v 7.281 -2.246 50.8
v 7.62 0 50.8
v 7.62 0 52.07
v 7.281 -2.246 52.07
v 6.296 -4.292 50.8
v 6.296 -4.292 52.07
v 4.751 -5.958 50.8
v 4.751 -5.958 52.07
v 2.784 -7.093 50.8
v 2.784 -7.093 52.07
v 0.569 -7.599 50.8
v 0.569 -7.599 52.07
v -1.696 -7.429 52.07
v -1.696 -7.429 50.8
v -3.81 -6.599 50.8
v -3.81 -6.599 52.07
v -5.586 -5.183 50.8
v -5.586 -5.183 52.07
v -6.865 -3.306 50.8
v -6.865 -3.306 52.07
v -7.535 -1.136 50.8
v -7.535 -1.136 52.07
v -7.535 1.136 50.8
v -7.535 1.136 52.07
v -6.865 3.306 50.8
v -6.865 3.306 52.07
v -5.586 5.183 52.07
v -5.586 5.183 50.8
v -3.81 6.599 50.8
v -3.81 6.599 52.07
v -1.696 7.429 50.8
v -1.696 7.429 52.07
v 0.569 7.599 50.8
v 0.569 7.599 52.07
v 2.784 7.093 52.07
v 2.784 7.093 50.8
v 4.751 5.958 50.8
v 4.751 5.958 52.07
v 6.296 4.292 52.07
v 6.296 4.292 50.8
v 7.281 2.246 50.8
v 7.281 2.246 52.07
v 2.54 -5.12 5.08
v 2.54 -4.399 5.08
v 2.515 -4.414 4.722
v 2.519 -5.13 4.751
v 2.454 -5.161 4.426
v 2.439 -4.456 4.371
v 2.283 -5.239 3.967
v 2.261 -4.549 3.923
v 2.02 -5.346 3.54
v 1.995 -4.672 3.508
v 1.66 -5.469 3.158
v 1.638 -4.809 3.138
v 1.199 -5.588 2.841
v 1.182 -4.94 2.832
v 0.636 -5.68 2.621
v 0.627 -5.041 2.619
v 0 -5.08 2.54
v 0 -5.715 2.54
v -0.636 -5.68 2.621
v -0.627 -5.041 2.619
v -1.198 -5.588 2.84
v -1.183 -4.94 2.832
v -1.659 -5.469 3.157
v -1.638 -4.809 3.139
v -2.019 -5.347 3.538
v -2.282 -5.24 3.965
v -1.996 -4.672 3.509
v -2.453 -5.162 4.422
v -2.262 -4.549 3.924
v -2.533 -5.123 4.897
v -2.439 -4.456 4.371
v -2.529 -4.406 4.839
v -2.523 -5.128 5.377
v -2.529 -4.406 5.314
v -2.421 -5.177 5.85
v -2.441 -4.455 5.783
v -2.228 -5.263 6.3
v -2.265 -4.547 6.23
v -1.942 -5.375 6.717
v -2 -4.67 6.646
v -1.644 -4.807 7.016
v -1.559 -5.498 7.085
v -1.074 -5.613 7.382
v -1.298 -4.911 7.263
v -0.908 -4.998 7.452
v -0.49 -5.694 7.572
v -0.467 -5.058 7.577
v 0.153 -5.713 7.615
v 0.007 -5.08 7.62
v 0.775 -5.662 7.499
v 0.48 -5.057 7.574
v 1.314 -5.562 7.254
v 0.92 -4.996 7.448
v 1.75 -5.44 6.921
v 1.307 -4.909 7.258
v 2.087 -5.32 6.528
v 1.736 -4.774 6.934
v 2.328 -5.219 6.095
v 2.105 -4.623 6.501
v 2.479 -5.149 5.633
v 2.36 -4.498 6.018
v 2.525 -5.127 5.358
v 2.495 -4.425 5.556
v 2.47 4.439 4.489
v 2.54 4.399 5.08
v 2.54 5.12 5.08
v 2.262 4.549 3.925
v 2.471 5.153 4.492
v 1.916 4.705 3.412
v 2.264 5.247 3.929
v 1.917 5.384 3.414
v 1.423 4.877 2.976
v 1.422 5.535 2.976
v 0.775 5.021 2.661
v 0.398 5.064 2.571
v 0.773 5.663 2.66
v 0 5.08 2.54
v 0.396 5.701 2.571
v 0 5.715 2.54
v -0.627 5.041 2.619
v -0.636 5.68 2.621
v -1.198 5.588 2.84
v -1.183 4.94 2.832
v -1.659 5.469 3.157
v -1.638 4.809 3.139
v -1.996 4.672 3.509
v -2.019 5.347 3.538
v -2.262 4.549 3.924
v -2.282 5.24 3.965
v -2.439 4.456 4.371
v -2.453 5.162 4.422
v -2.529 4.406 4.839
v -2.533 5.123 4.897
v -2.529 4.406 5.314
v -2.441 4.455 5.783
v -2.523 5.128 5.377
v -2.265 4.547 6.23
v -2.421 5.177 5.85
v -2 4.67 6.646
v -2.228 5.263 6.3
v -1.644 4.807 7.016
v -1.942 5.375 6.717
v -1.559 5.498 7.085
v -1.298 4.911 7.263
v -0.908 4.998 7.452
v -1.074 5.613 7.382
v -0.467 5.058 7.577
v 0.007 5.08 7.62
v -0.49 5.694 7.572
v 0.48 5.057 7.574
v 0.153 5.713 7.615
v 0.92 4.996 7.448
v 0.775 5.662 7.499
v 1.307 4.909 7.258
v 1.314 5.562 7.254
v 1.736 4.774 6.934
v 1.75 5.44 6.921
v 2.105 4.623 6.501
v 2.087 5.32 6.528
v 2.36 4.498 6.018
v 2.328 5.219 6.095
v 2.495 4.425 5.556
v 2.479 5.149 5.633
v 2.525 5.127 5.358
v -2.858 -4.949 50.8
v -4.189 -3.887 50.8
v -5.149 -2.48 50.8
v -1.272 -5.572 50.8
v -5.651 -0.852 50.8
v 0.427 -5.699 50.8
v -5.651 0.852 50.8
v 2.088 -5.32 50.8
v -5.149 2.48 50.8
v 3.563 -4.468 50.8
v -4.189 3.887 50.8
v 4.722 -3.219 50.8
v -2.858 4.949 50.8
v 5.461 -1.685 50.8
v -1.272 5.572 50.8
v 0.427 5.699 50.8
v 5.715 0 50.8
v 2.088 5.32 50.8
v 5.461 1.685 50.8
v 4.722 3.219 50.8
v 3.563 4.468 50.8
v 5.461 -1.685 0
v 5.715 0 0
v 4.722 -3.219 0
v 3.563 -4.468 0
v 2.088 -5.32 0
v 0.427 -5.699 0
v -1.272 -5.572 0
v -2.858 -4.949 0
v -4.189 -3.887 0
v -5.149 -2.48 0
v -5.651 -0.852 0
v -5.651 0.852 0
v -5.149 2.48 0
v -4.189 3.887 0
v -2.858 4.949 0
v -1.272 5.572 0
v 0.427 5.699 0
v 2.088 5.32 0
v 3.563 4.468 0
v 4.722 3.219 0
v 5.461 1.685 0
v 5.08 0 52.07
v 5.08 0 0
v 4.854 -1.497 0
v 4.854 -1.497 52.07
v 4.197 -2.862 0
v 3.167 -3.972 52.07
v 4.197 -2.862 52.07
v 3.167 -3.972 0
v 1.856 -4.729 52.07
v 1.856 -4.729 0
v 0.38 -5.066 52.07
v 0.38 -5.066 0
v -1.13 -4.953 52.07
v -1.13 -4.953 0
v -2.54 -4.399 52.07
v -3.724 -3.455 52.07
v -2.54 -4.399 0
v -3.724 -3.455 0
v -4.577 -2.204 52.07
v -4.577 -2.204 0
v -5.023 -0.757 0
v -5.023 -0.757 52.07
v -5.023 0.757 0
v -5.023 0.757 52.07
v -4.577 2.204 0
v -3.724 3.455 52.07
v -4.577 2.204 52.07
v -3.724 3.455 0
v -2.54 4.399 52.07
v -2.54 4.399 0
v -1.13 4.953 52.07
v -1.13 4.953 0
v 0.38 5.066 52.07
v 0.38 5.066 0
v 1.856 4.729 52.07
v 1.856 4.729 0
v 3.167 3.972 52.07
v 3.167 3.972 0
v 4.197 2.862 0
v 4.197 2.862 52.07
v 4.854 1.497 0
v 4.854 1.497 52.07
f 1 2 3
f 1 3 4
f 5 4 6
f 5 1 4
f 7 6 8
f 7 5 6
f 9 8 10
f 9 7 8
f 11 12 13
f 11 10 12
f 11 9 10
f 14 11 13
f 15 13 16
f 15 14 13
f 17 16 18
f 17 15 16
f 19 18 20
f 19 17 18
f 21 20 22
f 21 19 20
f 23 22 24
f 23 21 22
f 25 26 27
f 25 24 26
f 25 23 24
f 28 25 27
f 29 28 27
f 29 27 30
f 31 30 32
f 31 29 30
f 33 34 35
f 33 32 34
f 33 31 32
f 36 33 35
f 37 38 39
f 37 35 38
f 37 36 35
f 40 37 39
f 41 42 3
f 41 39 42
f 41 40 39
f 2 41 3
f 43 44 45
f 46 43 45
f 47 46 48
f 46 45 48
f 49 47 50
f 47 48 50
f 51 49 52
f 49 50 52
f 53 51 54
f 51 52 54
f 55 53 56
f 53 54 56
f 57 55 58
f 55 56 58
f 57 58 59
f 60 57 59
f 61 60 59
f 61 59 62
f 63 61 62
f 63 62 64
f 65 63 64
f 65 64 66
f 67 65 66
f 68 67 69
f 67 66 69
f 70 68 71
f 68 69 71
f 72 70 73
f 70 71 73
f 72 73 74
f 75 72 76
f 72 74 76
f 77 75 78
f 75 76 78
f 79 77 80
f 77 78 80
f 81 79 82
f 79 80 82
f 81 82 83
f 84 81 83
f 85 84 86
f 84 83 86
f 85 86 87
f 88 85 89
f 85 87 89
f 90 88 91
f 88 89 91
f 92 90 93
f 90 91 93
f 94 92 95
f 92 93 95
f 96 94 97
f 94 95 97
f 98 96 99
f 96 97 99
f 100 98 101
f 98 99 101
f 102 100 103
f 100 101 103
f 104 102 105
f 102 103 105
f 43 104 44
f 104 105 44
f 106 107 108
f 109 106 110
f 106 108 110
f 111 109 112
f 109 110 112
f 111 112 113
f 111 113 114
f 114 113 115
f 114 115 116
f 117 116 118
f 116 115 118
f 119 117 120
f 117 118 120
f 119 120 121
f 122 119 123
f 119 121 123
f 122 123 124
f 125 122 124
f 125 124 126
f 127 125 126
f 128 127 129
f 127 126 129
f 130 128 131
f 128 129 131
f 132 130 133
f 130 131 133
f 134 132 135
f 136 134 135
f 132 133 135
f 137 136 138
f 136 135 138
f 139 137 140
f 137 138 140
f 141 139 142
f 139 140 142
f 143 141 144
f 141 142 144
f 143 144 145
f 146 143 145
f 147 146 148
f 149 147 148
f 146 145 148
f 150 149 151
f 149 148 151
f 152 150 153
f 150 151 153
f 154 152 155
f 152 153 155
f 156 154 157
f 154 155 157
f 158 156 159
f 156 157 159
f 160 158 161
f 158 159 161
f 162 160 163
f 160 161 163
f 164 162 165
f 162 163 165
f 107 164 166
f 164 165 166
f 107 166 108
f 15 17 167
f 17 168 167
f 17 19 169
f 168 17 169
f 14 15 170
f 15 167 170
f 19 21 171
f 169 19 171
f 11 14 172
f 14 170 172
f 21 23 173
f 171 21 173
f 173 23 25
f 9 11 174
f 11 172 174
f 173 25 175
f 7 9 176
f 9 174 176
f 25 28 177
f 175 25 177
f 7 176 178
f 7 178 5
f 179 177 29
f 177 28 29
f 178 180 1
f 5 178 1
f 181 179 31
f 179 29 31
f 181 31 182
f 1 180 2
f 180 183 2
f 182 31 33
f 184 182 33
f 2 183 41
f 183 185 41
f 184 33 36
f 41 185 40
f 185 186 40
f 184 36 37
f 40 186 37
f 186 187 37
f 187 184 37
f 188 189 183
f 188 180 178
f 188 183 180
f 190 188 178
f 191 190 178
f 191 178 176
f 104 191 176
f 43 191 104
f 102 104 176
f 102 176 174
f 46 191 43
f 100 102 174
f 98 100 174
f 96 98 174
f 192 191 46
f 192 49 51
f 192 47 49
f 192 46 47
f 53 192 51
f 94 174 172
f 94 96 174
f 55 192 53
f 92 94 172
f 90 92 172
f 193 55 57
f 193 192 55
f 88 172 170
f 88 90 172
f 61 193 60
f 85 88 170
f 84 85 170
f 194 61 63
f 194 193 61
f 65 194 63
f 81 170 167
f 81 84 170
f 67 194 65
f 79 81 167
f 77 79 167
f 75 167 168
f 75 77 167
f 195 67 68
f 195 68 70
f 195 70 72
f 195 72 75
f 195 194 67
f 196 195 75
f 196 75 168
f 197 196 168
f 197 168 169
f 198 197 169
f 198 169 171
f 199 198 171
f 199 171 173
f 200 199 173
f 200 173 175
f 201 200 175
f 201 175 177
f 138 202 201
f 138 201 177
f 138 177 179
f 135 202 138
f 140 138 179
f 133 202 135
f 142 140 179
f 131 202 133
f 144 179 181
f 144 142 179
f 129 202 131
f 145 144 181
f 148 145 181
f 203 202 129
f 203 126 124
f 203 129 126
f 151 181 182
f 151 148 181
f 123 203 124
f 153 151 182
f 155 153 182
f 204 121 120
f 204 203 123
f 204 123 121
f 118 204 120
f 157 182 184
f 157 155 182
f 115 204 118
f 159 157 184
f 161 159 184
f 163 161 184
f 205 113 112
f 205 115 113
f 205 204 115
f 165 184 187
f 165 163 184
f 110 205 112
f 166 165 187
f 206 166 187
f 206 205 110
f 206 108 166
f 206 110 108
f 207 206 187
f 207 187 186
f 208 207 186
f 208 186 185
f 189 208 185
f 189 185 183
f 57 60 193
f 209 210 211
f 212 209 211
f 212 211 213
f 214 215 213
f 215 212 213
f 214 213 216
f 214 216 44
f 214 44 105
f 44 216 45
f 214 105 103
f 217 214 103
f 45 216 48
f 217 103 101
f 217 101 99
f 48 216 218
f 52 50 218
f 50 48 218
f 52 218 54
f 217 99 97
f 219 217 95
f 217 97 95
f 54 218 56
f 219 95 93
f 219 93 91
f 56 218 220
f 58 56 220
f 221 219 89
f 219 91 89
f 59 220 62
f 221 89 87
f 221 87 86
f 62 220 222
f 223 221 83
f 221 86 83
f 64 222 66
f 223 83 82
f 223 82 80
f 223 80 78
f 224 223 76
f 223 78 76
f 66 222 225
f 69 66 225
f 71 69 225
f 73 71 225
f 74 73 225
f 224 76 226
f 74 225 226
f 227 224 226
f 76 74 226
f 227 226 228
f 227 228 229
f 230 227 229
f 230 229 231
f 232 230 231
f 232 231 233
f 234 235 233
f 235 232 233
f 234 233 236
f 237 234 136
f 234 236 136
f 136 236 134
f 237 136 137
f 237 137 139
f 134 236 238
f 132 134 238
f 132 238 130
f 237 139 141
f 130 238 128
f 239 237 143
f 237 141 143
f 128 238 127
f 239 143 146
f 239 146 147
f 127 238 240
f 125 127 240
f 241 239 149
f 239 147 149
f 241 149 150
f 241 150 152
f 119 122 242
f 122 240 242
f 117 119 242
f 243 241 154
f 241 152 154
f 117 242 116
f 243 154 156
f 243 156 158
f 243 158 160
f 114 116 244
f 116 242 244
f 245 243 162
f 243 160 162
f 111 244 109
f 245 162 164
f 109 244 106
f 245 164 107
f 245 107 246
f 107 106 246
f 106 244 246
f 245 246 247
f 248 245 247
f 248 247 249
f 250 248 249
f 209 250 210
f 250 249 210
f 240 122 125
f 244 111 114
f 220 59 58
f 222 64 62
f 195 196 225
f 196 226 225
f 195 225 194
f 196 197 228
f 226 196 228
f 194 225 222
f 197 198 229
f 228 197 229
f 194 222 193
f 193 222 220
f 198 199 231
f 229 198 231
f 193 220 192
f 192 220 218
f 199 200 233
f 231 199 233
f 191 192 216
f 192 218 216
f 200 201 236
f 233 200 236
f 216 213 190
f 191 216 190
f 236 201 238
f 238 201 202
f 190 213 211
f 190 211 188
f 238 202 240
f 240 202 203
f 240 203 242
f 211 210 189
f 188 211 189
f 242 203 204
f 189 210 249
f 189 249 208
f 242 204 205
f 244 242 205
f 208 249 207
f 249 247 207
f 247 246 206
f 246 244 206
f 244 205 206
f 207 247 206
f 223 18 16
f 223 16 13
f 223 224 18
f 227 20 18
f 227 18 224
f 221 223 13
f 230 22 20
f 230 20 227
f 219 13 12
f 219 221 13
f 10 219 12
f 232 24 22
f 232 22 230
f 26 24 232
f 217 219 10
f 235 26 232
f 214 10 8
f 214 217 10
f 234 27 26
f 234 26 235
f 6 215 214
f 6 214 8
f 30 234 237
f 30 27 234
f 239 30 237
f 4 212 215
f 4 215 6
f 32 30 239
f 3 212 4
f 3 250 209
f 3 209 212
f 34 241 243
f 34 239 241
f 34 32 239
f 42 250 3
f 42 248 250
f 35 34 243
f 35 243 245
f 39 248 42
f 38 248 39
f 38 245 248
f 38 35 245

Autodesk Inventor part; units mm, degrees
ref_plane "YZ Plane" through (0, 0, 0) normal (1, 0, 0) x (0, 1, 0)
ref_plane "XZ Plane" through (0, 0, 0) normal (0, 1, 0) x (-1, 0, 0)
sketch "Sketch1" plane through (0, 0, 0) normal (0, 0, 1) x (1, 0, 0)
  circle A0 centre (0, 0) radius 5.715
  circle A1 centre (0, 0) radius 5.08
  line L0 (0, 0) -> (5.715, 0)
  dimension "d0" = 11.43
  dimension "d1" = 10.16
extrude "Extrusion1" add sketch "Sketch1" along normal blind 50.8
sketch "Sketch2" plane through (0, 0, 50.8) normal (0, 0, 1) x (1, 0, 0)
  circle A0 centre (0, 0) radius 5.08 projected
  circle A1 centre (0, 0) radius 5.715 projected
  circle A2 centre (0, 0) radius 7.62
  dimension "d4" = 15.24
extrude "Extrusion2" add sketch "Sketch2" along normal blind 1.27 contours A1 | A2
ref_plane "Work Plane2" through (0, 6.35, 0) normal (0, 1, 0) x (1, 0, 0)
ref_plane "Work Plane1" through (0, 0, 0) normal (0, 1, 0) x (1, 0, 0)
sketch "Sketch3" plane through (0, 6.35, 0) normal (0, 1, 0) x (1, 0, 0)
  line L0 (0, 0) -> (0, -5.08)
  circle A0 centre (0, -5.08) radius 2.54
  dimension "d9" = 5.08
  dimension "d10" = 5.08
extrude "Extrusion3" cut sketch "Sketch3" against normal blind 25.4
properties part number "Pin" material "Steel"
